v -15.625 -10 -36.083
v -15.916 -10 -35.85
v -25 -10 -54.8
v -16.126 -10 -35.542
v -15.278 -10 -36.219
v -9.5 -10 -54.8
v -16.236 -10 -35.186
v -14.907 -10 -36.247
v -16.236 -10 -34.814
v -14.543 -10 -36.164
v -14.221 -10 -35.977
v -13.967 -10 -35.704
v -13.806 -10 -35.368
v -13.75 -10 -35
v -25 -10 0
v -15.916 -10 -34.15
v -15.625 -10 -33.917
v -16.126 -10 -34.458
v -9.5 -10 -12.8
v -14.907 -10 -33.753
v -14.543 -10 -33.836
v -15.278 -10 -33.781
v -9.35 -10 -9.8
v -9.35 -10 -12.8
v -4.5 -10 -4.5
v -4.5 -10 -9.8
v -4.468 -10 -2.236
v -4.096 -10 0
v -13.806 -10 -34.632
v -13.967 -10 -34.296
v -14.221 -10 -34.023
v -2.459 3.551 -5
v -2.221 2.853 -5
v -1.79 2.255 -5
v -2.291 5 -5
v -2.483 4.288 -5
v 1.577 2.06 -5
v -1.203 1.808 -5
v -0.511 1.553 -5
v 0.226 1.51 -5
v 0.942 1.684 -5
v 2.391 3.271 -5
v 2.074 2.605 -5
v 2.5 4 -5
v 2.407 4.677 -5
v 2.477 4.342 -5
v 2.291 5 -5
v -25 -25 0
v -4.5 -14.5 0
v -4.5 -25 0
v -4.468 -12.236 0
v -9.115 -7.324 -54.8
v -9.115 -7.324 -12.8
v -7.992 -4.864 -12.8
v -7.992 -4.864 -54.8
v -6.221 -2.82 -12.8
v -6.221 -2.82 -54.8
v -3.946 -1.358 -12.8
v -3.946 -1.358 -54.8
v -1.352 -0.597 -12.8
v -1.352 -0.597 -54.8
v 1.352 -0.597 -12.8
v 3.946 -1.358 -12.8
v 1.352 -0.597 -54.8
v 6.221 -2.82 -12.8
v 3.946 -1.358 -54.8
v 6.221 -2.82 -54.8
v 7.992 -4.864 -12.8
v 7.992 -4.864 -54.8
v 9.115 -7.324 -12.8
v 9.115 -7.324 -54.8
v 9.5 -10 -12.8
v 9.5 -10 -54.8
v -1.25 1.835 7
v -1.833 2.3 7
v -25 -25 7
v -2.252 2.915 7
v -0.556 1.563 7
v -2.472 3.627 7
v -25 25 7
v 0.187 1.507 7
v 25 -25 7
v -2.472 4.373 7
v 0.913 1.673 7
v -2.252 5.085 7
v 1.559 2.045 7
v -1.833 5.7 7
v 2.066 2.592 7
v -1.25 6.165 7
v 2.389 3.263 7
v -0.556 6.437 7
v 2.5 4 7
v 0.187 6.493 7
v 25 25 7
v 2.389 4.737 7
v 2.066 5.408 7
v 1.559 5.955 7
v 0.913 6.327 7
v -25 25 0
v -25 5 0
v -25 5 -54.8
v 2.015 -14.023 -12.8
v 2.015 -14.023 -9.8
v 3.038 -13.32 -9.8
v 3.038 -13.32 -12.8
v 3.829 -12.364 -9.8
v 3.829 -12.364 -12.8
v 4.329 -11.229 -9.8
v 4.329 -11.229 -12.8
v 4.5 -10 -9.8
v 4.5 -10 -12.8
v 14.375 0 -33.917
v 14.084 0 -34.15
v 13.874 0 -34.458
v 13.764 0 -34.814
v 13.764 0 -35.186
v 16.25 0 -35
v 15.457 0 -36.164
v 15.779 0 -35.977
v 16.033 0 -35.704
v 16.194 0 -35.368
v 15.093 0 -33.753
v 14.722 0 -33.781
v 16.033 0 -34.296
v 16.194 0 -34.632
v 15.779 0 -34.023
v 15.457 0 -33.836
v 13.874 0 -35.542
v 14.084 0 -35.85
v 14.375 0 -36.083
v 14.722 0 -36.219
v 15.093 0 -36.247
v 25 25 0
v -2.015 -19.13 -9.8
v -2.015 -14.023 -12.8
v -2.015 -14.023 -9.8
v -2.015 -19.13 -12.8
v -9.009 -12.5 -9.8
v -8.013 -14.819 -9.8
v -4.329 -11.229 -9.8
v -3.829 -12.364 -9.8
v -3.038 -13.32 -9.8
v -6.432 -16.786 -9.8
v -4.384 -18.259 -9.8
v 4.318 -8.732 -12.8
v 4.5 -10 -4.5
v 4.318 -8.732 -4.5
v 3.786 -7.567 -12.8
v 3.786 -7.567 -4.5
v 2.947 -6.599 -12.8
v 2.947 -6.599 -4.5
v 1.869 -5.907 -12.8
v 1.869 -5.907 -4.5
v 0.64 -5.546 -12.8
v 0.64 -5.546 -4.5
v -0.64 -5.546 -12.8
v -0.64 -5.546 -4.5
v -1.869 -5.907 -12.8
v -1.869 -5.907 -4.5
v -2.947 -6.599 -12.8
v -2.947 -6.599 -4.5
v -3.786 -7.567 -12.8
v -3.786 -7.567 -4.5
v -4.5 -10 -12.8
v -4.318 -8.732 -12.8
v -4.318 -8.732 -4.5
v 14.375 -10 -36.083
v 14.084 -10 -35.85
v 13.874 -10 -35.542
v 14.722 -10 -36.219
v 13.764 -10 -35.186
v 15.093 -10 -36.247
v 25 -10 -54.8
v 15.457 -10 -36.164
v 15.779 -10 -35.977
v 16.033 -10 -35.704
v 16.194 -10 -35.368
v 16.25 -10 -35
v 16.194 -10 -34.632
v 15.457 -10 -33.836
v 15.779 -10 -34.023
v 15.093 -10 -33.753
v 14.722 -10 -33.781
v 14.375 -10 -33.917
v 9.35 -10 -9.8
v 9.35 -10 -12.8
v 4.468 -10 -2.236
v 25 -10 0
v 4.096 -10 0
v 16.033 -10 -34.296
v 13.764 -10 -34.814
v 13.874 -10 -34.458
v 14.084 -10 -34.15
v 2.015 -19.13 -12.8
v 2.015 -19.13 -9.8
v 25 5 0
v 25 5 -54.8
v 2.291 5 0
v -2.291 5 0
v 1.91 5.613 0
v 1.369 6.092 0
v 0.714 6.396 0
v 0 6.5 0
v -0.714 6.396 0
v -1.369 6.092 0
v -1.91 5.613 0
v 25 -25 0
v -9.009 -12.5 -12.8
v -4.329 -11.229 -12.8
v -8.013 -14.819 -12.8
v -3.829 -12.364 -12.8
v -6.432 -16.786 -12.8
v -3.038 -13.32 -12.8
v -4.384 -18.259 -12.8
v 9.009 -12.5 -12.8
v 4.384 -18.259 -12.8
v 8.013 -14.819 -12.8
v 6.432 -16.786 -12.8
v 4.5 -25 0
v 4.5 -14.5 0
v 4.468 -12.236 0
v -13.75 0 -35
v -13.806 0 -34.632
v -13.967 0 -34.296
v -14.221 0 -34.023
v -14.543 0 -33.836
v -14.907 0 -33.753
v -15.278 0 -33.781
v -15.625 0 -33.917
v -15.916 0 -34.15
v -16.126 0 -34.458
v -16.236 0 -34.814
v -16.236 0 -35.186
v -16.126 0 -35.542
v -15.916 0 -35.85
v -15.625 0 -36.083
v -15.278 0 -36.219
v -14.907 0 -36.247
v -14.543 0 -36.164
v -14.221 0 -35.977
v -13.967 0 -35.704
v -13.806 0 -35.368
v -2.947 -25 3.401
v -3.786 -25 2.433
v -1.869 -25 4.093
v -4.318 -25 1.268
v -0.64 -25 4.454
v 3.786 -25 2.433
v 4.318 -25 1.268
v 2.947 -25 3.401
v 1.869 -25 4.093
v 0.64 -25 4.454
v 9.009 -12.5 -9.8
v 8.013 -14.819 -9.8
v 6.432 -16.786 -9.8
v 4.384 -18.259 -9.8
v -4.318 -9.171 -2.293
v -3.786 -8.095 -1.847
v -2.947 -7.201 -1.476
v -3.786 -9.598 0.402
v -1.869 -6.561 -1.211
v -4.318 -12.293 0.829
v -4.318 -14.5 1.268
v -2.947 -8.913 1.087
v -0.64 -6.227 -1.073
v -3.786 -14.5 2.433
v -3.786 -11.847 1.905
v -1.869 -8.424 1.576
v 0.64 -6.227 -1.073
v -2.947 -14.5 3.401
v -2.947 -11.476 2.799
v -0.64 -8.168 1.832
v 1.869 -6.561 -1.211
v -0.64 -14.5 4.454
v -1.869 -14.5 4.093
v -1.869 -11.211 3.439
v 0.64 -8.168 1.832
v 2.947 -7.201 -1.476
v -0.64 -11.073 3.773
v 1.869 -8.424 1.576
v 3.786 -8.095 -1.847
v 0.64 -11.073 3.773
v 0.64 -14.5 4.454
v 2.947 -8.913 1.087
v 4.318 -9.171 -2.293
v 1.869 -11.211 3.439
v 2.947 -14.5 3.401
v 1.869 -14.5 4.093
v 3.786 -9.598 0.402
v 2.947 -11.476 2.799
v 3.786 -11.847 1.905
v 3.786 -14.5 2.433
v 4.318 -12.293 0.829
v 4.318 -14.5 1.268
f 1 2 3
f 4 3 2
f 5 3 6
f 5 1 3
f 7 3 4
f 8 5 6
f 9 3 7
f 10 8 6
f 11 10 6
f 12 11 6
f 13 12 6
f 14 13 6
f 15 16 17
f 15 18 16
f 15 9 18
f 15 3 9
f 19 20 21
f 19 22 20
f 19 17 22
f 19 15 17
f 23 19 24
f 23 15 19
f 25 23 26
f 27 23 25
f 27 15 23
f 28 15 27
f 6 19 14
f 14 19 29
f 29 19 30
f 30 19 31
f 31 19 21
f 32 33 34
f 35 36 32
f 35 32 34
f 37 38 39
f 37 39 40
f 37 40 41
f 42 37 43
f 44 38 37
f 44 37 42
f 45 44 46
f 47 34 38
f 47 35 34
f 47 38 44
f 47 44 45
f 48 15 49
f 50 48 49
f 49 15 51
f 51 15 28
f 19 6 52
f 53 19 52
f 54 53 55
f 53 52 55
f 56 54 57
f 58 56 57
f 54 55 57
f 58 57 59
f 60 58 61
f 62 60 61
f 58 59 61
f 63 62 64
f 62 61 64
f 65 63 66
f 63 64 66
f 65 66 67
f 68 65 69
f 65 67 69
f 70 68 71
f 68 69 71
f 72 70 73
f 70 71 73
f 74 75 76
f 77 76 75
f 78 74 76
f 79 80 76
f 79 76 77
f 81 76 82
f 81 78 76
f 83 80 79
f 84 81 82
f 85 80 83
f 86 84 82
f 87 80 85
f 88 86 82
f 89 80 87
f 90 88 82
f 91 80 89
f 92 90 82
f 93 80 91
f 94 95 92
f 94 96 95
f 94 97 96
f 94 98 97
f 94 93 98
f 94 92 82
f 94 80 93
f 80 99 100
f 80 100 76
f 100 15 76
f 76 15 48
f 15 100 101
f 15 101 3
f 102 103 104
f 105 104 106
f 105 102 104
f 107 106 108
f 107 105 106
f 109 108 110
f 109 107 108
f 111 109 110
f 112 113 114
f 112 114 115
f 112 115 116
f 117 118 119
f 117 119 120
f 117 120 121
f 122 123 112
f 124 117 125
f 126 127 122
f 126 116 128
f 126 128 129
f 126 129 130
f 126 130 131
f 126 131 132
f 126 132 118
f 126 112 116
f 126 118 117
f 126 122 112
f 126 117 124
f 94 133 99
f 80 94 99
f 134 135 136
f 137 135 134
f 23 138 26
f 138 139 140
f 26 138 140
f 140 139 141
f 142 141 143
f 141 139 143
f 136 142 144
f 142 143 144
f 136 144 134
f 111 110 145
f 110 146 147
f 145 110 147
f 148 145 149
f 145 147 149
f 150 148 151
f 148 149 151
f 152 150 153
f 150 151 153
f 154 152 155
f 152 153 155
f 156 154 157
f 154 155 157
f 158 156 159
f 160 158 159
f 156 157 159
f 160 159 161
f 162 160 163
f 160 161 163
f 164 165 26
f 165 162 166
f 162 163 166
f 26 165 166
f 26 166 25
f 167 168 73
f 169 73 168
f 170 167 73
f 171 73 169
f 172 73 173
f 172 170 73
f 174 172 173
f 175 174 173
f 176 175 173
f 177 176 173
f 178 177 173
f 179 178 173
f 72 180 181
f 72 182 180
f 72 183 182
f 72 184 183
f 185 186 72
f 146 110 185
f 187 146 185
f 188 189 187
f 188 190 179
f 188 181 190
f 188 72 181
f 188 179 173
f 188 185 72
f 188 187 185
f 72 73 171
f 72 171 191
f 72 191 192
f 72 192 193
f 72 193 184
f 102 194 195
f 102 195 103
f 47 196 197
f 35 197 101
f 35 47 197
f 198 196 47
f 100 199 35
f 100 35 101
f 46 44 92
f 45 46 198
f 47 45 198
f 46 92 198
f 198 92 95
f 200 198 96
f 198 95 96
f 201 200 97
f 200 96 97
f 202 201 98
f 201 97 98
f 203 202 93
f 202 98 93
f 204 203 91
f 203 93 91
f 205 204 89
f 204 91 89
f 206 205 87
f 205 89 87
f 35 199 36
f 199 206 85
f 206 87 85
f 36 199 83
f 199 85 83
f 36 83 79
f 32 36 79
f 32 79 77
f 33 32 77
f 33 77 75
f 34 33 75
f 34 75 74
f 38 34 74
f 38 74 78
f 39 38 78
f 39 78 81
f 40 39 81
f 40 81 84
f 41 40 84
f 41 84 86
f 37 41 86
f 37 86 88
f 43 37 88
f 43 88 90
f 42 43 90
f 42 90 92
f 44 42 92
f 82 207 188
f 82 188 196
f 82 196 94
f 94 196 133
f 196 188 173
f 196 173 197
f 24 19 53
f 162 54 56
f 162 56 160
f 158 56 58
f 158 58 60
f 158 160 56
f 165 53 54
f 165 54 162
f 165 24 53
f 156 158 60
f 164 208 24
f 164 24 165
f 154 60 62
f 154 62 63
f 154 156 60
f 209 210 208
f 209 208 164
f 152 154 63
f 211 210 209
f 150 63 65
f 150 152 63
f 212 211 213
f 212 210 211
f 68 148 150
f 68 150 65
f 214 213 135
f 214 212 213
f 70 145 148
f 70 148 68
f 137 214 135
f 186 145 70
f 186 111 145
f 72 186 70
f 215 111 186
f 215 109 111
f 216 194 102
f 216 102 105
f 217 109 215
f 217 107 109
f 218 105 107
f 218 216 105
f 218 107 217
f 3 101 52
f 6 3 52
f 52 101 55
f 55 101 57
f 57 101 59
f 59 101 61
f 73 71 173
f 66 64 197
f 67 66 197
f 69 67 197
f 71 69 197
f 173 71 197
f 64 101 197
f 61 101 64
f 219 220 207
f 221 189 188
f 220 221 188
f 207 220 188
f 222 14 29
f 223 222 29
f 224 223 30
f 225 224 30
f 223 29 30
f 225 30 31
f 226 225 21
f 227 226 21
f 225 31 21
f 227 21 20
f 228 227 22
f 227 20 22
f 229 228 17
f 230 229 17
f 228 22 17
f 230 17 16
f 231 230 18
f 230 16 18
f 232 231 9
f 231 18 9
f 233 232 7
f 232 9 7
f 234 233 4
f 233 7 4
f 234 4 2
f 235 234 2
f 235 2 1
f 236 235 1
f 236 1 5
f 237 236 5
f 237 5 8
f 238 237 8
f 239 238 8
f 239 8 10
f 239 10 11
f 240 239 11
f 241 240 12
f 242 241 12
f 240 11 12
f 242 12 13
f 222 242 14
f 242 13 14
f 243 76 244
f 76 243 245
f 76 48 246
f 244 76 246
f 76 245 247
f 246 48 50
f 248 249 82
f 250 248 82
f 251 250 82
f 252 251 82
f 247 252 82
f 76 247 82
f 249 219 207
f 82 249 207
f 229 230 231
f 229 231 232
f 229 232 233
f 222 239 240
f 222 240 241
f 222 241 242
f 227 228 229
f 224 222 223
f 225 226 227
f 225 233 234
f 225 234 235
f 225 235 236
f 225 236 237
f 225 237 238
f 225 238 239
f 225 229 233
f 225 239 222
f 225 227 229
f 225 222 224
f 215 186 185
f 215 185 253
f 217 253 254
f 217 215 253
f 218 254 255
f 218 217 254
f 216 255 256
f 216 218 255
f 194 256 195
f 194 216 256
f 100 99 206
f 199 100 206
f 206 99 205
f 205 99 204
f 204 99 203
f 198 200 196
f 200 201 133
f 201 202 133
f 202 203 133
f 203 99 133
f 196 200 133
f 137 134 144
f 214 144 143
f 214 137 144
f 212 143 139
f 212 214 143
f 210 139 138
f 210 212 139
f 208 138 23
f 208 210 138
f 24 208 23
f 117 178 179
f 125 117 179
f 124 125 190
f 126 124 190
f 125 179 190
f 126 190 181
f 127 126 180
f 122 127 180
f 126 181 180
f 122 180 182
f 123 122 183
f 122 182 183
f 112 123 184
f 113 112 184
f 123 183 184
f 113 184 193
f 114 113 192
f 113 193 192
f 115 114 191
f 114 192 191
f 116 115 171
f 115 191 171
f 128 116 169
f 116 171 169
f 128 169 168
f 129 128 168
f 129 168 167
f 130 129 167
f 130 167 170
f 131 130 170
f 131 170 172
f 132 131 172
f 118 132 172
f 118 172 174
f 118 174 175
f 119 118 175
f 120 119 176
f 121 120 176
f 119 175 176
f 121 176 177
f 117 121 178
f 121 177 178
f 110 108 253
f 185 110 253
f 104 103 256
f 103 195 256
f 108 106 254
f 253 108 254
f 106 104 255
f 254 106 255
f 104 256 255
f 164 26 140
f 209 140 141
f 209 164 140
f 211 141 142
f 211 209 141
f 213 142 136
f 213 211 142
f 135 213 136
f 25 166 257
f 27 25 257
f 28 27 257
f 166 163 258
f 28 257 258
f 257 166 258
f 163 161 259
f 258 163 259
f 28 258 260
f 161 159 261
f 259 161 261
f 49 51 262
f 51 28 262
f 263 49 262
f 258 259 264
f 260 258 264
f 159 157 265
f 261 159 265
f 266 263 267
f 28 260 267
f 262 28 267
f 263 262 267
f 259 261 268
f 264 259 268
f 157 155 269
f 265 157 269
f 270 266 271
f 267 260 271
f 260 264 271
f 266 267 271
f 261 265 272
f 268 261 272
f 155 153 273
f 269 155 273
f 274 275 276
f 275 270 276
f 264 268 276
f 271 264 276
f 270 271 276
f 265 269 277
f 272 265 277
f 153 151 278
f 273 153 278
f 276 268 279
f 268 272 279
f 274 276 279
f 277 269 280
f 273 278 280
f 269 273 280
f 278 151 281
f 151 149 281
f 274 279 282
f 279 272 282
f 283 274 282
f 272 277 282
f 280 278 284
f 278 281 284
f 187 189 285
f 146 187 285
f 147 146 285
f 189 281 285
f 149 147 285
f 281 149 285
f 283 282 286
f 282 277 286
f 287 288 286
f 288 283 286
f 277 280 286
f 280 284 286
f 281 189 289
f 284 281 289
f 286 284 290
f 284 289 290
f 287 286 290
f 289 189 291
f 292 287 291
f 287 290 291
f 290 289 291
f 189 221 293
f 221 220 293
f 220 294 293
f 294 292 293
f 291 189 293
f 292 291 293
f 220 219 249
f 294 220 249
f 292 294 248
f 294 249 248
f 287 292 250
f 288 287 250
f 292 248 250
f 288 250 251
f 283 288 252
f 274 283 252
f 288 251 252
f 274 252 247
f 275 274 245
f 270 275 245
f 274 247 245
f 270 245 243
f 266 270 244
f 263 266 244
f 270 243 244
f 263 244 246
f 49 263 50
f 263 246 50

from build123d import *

# Parameters (mm, degrees)
F1_DEPTH  = 7
F4_DEPTH  = 54.8
F5_R      = 9.5
F6_DEPTH  = 42
F8_R      = 4.5
F9_DEPTH  = 25
F10_R     = 4.5
F11_DEPTH = 10.5
F12_R     = 4.5
F15_R     = 1.25
F16_DEPTH = 10
F18_DEPTH = 3
F2_R      = 2.5
F19_DEPTH = 12


with BuildPart() as f1:
    # F0 (on Top) → F1 (new body)
    with BuildSketch(Plane.XY):
        Polygon((-25, -25), (0, -25), (25, -25), (25, 25), (-25, 25), align=None)
    extrude(amount=F1_DEPTH)

    # F3 (on face) → F4 (join)
    with BuildSketch(Plane.XY):
        Polygon((-25, -10), (0, -10), (25, -10), (25, 5), (-25, 5), align=None)
    extrude(amount=-F4_DEPTH)

    # F5 (on face) → F6 (cut)
    with BuildSketch(Plane(origin=(0, 0, -54.8), x_dir=(1, 0, 0), z_dir=(0, 0, -1))):
        with Locations((0, 10)):
            Circle(F5_R)
    extrude(amount=-F6_DEPTH, mode=Mode.SUBTRACT)

    # F8 (on offset) → F9 (cut)
    with BuildSketch(Plane.XY.offset(-4.5)):
        with Locations((0, -10)):
            Circle(F8_R)
    extrude(amount=-F9_DEPTH, mode=Mode.SUBTRACT)

    # F10 (on face) → F11 (cut)
    with BuildSketch(Plane.XZ.offset(25)):
        Circle(F10_R)
    extrude(amount=-F11_DEPTH, mode=Mode.SUBTRACT)

    # F14: sweep along a path in F13
    with BuildLine(Plane.YZ) as f14_path:
        ThreePointArc((-10, -4.5), (-11.318019, -1.318019), (-14.5, 0))
    # F12 (on offset) → F14 (sweep, cut)
    with BuildSketch(Plane.XY.offset(-4.5)):
        with Locations((0, -10)):
            Circle(F12_R)
    sweep(path=f14_path.line, mode=Mode.SUBTRACT)

    # F15 (on face) → F16 (cut)
    with BuildSketch(Plane.XZ.offset(10)):
        with Locations((15, -35)):
            Circle(F15_R)
        with Locations((-15, -35)):
            Circle(F15_R)
    extrude(amount=-F16_DEPTH, mode=Mode.SUBTRACT)

    # F17 (on face) → F18 (join)
    with BuildSketch(Plane(origin=(0, 0, -12.8), x_dir=(1, 0, 0), z_dir=(0, 0, -1))):
        with BuildLine():
            Line((-2.015418, 14.023443), (-2.015418, 19.130202))
            ThreePointArc((-2.015418, 19.130202), (0, 0.65), (2.015418, 19.130202))
            Line((2.015418, 19.130202), (2.015418, 14.023443))
            ThreePointArc((2.015418, 14.023443), (0, 5.5), (-2.015418, 14.023443))
        make_face()
    extrude(amount=-F18_DEPTH)

    # F2 (on face) → F19 (cut)
    with BuildSketch(Plane.XY.offset(7)):
        with Locations((0, 4)):
            Circle(F2_R)
    extrude(amount=-F19_DEPTH, mode=Mode.SUBTRACT)


solid = f1.part
